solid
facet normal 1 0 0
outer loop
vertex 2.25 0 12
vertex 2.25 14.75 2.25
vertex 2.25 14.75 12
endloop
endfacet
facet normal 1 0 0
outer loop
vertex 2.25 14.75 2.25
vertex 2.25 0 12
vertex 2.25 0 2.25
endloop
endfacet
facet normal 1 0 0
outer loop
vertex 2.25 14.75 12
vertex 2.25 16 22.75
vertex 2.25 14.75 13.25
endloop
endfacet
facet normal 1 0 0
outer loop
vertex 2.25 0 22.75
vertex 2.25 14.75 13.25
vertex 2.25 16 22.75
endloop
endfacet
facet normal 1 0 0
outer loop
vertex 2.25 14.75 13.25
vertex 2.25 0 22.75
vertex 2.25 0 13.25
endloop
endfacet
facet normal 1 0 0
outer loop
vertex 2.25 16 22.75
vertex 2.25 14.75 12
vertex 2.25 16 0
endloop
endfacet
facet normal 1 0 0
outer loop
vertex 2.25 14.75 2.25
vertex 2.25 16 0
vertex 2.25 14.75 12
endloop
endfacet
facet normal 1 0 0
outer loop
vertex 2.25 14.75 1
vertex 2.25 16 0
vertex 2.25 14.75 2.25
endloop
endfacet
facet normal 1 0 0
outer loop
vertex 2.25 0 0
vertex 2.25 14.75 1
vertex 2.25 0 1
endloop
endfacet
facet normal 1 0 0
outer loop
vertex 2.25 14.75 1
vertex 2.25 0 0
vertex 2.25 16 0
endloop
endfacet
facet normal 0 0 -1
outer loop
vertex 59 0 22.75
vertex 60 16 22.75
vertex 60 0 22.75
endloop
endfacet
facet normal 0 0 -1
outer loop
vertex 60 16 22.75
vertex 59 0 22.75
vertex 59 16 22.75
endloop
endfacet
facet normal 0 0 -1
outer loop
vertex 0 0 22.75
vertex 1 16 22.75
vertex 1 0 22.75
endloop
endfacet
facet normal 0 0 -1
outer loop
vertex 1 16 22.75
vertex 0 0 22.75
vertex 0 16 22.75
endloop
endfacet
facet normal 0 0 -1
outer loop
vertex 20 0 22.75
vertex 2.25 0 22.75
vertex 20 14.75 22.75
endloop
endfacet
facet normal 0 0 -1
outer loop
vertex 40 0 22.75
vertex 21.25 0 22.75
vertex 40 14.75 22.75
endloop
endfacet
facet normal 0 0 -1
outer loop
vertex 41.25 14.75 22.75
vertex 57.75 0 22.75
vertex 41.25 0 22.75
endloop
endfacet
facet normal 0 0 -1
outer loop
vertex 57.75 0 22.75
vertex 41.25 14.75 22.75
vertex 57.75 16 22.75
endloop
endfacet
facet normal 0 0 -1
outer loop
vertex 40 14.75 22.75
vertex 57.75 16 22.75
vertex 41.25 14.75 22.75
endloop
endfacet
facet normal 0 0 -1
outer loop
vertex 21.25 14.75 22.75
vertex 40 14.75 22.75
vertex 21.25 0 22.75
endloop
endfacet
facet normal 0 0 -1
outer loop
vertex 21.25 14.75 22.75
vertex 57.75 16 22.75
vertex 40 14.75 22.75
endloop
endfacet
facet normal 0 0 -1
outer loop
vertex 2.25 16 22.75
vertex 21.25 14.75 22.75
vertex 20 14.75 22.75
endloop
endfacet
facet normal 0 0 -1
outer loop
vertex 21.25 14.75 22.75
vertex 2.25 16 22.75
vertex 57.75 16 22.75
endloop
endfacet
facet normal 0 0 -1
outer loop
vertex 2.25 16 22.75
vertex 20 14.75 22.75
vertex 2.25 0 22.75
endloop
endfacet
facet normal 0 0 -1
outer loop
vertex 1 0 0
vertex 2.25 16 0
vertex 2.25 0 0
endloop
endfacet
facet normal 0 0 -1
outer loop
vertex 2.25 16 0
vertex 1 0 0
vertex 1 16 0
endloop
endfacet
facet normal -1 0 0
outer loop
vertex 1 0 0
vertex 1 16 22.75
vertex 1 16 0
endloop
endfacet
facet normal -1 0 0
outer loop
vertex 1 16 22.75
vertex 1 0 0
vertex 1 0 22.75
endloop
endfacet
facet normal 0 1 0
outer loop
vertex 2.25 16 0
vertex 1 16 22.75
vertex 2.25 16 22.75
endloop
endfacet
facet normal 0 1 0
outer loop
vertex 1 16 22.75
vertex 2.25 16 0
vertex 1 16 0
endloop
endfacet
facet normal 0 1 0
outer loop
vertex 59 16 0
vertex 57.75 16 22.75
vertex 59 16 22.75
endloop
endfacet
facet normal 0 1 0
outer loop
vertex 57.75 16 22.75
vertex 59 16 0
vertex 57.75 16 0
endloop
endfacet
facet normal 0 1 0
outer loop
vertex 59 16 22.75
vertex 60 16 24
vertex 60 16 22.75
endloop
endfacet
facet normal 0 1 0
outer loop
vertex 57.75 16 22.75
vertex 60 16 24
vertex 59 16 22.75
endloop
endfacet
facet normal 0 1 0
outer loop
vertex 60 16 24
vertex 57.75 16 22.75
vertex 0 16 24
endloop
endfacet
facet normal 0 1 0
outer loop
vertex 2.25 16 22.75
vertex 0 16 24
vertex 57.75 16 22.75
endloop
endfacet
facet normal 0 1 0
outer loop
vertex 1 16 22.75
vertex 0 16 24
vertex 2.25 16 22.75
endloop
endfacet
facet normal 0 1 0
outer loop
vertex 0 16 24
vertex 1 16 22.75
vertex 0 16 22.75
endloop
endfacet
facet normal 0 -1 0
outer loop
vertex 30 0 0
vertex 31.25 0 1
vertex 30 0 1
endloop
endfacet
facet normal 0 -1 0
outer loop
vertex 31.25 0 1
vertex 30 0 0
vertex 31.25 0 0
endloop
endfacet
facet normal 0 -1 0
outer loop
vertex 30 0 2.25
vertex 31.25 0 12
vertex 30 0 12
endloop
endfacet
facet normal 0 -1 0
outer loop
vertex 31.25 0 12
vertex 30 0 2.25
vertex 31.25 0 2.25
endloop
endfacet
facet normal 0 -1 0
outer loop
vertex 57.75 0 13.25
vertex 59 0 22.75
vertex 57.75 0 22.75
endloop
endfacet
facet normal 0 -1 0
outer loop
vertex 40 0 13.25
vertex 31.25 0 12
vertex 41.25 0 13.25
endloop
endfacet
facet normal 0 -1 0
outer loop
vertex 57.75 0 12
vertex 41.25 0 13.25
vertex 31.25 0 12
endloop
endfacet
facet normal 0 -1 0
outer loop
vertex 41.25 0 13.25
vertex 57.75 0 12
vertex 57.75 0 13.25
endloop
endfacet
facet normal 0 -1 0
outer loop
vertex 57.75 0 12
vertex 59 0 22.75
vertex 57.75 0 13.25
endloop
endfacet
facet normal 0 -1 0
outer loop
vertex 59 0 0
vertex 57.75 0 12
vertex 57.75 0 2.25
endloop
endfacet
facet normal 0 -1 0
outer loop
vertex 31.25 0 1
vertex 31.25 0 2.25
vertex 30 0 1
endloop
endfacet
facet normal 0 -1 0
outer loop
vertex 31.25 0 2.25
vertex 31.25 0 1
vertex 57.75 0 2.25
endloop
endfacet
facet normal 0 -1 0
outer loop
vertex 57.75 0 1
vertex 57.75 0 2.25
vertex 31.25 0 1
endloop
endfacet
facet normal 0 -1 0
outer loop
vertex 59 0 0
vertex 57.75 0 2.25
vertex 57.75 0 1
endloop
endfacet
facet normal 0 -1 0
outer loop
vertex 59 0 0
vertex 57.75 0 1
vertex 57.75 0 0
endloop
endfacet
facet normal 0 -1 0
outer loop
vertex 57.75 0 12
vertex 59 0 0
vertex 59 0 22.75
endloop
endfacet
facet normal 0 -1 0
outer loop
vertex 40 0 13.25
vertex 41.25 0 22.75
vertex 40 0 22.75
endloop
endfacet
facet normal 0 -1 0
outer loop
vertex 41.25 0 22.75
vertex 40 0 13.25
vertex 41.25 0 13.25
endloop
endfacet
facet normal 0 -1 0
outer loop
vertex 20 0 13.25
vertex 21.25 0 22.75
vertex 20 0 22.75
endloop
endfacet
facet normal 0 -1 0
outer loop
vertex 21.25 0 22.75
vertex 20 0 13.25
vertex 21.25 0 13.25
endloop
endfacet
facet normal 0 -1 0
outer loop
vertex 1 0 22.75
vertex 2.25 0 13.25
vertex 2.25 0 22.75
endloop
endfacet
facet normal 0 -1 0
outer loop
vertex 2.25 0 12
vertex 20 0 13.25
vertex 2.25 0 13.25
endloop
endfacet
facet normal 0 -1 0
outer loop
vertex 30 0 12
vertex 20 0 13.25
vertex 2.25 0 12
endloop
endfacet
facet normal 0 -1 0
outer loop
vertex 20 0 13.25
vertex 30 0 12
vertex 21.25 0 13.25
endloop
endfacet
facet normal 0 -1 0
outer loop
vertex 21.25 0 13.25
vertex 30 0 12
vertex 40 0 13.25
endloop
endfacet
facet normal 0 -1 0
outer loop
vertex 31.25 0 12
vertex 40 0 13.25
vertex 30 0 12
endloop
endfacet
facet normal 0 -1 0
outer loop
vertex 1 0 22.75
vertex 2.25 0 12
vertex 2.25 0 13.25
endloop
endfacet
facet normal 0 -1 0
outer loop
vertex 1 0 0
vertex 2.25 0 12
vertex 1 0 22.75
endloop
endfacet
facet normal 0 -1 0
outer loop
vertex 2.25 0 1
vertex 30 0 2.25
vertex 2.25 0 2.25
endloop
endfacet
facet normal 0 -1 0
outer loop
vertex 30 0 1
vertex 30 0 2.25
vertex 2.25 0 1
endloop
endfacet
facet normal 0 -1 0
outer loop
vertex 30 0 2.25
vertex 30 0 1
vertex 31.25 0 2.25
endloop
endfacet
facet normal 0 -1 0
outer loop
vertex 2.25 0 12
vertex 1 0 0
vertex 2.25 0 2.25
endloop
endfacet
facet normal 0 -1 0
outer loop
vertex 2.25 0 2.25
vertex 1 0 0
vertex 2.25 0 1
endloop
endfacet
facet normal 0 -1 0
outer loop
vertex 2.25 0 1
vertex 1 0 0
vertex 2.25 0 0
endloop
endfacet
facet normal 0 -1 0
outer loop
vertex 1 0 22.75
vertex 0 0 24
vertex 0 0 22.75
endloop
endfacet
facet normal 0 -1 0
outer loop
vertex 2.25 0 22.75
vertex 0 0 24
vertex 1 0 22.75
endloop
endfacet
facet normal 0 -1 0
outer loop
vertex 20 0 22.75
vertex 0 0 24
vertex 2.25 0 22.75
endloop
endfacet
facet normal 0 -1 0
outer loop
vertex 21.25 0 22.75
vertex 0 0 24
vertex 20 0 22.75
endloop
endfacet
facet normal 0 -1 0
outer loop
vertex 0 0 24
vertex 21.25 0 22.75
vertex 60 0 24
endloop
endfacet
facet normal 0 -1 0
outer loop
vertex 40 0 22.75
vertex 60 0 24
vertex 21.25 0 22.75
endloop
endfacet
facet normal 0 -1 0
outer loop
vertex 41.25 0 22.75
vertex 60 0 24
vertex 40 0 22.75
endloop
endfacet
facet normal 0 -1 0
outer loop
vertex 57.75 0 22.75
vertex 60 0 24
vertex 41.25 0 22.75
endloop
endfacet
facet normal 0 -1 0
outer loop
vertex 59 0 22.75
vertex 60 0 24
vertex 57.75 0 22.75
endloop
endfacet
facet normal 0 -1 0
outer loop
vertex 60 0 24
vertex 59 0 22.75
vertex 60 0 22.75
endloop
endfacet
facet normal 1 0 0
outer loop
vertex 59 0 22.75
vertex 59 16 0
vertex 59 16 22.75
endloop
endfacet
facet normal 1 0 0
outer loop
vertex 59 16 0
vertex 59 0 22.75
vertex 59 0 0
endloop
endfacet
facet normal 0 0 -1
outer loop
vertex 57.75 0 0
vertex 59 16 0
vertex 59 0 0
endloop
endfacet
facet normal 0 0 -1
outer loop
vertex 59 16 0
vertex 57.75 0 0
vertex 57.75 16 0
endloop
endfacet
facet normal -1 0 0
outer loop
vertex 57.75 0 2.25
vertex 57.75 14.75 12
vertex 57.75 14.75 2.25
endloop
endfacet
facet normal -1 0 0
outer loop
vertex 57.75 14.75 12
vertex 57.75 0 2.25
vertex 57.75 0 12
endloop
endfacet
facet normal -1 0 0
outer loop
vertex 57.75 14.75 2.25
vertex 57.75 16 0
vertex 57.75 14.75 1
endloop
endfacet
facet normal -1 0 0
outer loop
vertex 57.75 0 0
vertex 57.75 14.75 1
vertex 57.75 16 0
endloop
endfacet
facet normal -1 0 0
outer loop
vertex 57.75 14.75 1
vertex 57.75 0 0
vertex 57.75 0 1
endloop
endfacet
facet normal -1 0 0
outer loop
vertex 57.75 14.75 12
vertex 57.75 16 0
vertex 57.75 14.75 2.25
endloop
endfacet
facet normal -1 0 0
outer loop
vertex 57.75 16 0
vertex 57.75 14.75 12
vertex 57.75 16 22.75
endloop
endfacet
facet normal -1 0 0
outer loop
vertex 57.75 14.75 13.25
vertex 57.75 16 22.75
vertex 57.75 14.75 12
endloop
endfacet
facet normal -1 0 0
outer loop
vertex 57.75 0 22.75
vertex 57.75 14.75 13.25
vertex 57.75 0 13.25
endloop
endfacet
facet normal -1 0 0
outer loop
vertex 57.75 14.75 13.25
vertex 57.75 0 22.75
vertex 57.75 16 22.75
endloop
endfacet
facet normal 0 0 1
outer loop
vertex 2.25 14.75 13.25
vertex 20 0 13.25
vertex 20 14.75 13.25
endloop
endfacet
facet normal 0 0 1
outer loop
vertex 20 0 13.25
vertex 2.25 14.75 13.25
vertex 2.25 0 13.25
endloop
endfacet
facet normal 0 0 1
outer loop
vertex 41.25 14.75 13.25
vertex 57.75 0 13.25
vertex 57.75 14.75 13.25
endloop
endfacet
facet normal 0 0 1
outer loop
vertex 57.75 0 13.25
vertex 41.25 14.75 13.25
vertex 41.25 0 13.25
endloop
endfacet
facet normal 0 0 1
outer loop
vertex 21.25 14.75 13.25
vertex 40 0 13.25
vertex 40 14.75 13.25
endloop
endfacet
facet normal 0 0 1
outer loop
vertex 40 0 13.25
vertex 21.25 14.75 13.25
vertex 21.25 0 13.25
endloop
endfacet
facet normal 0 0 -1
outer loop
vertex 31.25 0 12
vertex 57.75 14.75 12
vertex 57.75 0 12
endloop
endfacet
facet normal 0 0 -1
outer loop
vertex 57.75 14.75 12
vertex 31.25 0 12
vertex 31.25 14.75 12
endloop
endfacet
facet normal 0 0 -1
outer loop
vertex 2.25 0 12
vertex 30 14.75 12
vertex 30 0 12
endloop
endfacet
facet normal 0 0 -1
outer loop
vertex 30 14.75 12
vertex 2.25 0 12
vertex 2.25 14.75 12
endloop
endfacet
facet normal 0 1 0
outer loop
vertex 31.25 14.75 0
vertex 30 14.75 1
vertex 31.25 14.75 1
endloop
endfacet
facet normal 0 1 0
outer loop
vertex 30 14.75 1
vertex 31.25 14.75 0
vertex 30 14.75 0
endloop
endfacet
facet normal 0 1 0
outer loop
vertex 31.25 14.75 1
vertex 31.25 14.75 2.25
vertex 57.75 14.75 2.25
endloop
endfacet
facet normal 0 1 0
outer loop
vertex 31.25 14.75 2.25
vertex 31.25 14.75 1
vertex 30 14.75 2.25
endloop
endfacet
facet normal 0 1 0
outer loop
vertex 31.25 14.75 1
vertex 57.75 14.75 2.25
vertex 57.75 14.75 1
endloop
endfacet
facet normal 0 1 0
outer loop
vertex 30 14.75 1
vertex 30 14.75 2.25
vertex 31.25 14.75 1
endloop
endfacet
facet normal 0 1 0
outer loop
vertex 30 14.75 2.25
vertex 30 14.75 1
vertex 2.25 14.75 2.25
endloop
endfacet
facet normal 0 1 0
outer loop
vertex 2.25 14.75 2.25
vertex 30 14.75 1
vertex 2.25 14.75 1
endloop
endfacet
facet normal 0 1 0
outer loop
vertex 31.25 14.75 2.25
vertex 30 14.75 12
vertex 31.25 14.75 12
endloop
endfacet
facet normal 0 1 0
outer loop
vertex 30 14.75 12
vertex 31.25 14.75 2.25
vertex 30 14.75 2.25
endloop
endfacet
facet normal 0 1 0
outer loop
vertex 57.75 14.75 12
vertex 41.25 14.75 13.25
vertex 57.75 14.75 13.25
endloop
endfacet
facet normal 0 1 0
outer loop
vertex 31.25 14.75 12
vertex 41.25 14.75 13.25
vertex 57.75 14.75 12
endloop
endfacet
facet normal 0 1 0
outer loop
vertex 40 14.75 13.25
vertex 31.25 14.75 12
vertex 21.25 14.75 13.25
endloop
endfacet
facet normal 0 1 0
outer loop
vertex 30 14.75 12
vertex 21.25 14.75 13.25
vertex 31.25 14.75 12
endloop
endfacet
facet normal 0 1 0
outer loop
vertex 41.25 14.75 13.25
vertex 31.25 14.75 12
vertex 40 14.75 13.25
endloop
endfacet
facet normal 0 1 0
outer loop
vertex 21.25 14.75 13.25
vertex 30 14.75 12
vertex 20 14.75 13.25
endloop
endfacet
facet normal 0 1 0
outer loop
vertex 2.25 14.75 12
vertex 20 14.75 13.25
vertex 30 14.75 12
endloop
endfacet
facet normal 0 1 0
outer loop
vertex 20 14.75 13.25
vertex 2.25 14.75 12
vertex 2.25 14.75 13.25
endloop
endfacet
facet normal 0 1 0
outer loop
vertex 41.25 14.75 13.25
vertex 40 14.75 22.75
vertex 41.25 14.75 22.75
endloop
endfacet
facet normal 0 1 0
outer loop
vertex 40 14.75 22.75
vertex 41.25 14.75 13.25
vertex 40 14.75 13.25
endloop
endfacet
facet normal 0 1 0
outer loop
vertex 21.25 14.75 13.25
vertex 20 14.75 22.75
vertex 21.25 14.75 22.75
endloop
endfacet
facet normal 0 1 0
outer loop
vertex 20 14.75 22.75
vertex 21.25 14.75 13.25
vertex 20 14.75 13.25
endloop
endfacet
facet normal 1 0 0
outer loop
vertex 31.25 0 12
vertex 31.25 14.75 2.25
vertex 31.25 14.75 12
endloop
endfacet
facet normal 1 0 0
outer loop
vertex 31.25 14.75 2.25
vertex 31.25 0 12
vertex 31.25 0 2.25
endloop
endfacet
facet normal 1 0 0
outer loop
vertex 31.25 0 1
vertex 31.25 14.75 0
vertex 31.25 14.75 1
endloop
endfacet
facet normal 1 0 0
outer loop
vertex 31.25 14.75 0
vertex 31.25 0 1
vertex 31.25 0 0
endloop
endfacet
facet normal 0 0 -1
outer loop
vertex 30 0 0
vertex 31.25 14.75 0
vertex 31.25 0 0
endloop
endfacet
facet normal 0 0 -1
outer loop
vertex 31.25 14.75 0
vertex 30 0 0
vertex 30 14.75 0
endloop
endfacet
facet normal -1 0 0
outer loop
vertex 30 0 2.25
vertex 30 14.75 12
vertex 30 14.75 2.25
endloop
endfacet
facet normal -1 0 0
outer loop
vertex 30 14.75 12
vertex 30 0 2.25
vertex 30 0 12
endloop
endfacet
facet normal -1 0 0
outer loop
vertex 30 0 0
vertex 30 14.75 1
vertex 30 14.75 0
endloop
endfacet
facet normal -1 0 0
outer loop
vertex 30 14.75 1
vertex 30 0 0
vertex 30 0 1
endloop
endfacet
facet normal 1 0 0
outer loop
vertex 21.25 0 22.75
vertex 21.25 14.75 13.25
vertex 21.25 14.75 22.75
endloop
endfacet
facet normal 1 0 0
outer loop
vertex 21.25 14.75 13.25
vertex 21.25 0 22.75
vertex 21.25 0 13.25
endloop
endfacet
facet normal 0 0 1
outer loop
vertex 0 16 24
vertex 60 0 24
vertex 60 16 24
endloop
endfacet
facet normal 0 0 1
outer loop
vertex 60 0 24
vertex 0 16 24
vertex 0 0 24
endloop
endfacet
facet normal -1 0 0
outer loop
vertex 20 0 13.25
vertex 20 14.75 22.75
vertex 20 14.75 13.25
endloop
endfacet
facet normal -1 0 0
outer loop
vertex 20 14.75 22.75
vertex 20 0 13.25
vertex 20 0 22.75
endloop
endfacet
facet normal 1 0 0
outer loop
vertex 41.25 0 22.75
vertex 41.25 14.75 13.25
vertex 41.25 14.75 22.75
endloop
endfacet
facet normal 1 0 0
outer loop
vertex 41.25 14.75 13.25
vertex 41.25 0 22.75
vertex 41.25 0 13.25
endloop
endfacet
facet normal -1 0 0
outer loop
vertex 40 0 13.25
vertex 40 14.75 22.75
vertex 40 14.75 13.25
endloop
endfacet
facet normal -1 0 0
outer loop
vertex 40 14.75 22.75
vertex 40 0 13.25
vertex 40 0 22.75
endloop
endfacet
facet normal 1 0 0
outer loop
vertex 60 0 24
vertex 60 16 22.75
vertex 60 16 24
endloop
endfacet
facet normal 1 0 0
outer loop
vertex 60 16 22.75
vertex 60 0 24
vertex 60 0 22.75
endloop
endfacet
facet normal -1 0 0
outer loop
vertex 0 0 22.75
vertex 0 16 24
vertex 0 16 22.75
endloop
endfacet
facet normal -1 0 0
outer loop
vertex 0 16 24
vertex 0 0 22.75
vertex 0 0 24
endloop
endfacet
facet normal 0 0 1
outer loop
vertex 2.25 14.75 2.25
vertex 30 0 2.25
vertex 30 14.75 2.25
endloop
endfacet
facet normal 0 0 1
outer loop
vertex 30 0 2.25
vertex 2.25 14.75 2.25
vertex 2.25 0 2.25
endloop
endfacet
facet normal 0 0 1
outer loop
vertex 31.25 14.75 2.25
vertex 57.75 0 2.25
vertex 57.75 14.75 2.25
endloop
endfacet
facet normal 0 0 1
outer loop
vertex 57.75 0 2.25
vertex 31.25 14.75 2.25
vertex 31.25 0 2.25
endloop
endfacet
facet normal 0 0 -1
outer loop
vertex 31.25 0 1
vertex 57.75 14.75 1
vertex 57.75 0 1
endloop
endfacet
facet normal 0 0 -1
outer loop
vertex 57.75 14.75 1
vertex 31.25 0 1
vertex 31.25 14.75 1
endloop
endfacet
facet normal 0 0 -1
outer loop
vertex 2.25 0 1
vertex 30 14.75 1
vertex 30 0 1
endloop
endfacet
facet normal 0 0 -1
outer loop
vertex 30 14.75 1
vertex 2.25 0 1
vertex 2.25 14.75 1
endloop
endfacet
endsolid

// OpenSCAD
//Cassie TV Stand

width = 60;
depth = 16;
height = 24;
thickness = 1.25;

module top(){
    translate([0, 0, height - thickness])
    cube([width, depth, thickness]);
}

module sidewalls(){
    translate([1, 0, 0])
    cube([thickness, depth, height - thickness]);
    
    translate([width - thickness - 1, 0, 0])
    cube([thickness, depth, height - thickness]);
}

module angledSidewalls(){
    translate([1, 0, 0])
    rotate([0, 22.5, 0])
    cube([thickness, depth - thickness, (sin(22.5) * thickness + 0.1) + 1/cos(22.5)*(height - thickness)]);
    
    translate([width - thickness - 1, 0, -(sin(22.5) * thickness)])
    rotate([0, -22.5, 0])
    cube([thickness, depth - thickness, (sin(22.5) * thickness + 0.1) + 1/cos(22.5)*(height - thickness)]);
}

module back(){
    difference(){
        union(){
            translate([1, depth - thickness, 1])
            cube([width - 2, 0.25, height - thickness - 1]);
        }
        
        union(){
            translate([1, depth - thickness, 1])
            rotate([-45, 0, 0])
            cube([width, 2, 2]);
        }
        
    }
}

module bottom(){
    translate([1 + thickness, 0, 1])
    cube([width - 2*thickness - 2, depth - thickness, thickness]);
}

module shelves(){
    translate([thickness + 1, 0, height / 2])
    cube([width - 2*thickness - 2, depth - 1.25, thickness]);
    
    translate([width / 2, 0, 0])
    cube([thickness, depth - thickness, 12]);
    
    translate([width / 3, 0, 12])
    cube([thickness, depth - thickness, 12]);
    translate([2*width / 3, 0, 12])
    cube([thickness, depth - thickness, 12]);
}





module boxy(){
    
    top();
    
    sidewalls();
    
    //back();
    bottom();
    shelves();
    
}
color(c = [162/255, 132/255, 97/255, 1.0])
boxy();

module angled(){
    
    top();
    
    difference(){
        union(){
            angledSidewalls();
            back();
            bottom();
            shelves();
        }
        
        union(){
            
            translate([-20.648, 0, 0])
            rotate([0, 22.5, 0])
            cube([20, depth, 30]);
    
            translate([width - thickness - 1 + 1.353, 0, -(sin(22.5) * thickness)])
            rotate([0, -22.5, 0])
            cube([20, depth, 30]);
        }
    }
}//angled();
